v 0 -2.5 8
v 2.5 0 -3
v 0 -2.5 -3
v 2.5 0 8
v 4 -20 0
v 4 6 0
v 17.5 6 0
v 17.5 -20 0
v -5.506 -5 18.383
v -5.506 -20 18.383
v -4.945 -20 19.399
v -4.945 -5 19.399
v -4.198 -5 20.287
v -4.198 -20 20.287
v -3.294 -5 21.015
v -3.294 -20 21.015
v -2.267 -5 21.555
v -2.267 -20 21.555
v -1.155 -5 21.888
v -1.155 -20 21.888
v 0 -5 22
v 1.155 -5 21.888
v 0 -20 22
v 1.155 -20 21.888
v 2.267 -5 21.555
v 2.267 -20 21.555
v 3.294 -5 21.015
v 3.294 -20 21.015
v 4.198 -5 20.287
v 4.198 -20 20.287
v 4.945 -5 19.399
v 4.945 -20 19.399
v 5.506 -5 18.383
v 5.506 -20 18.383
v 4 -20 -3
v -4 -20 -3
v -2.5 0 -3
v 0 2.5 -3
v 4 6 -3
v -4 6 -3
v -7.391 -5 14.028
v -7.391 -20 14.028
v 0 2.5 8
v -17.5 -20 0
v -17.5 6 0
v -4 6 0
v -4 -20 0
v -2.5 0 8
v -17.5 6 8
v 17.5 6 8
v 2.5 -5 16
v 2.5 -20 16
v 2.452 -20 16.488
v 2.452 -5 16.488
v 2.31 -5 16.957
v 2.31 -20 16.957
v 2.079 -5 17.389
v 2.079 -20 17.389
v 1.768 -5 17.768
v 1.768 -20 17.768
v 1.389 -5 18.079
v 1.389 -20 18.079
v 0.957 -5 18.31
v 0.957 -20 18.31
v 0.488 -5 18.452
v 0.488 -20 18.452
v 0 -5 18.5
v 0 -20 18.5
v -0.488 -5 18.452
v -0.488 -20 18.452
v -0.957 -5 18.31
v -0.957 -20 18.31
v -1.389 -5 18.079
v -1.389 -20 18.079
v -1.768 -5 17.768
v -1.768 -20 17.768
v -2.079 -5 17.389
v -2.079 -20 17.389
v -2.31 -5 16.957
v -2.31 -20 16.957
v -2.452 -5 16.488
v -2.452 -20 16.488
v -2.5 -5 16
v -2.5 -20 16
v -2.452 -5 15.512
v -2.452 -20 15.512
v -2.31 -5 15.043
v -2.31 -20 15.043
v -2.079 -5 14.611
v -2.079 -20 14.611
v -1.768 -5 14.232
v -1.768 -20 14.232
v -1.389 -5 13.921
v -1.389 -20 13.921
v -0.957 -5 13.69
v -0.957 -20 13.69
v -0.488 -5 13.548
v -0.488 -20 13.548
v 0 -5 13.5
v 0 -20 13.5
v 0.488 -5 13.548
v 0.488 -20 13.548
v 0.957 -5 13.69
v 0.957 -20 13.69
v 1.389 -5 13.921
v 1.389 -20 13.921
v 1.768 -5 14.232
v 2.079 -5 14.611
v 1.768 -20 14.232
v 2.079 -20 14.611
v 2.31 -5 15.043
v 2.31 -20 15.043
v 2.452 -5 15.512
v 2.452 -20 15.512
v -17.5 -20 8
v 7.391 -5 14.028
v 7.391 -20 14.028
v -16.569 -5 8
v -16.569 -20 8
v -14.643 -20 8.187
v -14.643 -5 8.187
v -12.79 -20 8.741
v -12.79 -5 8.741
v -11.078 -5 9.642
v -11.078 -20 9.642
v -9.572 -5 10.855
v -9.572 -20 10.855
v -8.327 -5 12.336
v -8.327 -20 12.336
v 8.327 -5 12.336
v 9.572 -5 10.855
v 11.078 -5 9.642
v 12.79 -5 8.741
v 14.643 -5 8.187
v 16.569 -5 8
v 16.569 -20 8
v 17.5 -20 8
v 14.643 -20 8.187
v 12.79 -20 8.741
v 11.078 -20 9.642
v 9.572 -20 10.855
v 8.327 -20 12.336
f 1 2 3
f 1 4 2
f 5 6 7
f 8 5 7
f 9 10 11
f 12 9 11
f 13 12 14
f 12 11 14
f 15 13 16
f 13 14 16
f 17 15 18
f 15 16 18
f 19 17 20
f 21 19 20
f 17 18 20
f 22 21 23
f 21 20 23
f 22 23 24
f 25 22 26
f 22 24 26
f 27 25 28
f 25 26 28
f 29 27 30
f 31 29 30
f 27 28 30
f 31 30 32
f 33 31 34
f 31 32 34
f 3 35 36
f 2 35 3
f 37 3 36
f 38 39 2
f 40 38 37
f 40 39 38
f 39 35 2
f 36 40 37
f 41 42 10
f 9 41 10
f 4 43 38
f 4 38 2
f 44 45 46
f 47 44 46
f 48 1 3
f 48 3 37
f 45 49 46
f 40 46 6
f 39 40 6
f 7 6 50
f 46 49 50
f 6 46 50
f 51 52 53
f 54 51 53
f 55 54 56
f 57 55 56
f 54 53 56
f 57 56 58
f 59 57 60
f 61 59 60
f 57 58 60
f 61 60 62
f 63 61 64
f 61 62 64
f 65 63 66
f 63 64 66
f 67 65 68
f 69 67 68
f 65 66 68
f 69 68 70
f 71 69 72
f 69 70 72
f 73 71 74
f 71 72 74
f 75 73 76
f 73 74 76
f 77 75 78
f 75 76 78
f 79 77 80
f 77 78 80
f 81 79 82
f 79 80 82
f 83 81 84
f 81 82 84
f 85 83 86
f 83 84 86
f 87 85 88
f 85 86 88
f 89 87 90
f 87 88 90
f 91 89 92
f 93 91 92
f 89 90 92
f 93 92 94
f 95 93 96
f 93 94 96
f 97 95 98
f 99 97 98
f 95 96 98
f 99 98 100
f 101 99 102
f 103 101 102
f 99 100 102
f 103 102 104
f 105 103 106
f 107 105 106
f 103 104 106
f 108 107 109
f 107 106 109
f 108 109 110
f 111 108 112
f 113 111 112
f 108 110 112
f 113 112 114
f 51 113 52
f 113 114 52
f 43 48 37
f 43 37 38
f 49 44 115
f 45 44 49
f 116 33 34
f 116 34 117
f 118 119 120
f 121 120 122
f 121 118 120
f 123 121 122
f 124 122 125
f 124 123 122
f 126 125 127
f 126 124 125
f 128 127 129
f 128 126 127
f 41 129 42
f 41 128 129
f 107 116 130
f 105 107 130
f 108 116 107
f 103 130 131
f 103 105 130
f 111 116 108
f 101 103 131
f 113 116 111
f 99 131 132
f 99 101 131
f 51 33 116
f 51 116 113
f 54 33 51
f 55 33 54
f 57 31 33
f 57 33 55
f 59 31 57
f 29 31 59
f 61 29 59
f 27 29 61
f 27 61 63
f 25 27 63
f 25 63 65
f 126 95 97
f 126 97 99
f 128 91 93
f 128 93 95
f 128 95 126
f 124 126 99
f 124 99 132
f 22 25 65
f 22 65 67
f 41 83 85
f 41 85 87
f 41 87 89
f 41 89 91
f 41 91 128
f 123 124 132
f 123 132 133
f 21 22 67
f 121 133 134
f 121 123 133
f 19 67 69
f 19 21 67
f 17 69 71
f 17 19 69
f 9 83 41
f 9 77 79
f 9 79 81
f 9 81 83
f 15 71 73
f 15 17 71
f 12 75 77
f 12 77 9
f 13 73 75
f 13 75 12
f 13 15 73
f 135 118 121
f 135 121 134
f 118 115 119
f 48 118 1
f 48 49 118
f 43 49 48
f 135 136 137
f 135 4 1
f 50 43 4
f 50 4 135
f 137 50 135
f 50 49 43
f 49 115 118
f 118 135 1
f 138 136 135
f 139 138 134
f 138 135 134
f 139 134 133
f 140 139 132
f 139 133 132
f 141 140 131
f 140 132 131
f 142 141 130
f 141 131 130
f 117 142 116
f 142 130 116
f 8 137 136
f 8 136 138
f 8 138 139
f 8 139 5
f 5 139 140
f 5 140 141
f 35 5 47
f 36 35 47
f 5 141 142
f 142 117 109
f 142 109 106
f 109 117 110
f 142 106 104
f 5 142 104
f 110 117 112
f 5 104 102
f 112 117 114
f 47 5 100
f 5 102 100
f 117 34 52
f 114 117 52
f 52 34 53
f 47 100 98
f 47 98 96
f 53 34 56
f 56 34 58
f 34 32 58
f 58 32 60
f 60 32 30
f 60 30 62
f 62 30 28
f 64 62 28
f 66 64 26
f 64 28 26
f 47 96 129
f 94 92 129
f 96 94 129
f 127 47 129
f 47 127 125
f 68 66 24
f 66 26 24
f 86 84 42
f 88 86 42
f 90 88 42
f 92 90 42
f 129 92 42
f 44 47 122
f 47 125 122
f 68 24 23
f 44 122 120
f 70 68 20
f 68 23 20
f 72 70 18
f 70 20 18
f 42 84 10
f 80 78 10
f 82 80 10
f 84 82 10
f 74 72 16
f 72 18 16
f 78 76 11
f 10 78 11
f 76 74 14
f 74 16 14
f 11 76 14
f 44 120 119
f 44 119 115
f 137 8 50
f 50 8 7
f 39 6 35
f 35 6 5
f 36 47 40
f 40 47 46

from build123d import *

# Parameters (mm, degrees)
SKIZZE1_W                       = 35
SKIZZE1_H                       = 26
AUFSATZ_LINEAR_AUSTRAGEN1_DEPTH = 8
AUFSATZ_LINEAR_AUSTRAGEN2_DEPTH = 3
SKIZZE3_R                       = 2.5
AUFSATZ_LINEAR_AUSTRAGEN3_DEPTH = 15
VERRUNDUNG1_R                   = 10


with BuildPart() as part:
    # Skizze1 → Aufsatz-Linear austragen1 (new body)
    with BuildSketch(Plane.XY):
        with Locations((0, -7)):
            Rectangle(SKIZZE1_W, SKIZZE1_H)
        Polygon((0, 2.5), (-2.5, 0), (0, -2.5), (2.5, 0), align=None, mode=Mode.SUBTRACT)
    extrude(amount=AUFSATZ_LINEAR_AUSTRAGEN1_DEPTH)

    # Skizze2 → Aufsatz-Linear austragen2 (add)
    with BuildSketch(Plane(origin=(0, 0, 0), x_dir=(-1, 0, 0), z_dir=(0, 0, -1))):
        Polygon((0, 6), (-4, 6), (-4, -20), (0, -20), (4, -20), (4, 6), align=None)
        Polygon((-2.5, 0), (0, -2.5), (2.5, 0), (0, 2.5), align=None, mode=Mode.SUBTRACT)
    extrude(amount=AUFSATZ_LINEAR_AUSTRAGEN2_DEPTH)

    # Skizze3 → Aufsatz-Linear austragen3 (add)
    with BuildSketch(Plane.XZ.offset(20)):
        with BuildLine():
            Line((0, 8), (-10, 8))
            Line((-10, 8), (-5.506451268, 18.383064085))
            ThreePointArc((-5.506451268, 18.383064085), (0, 22), (5.506451268, 18.383064085))
            Line((5.506451268, 18.383064085), (10, 8))
            Line((10, 8), (0, 8))
        make_face()
        with Locations((0, 16)):
            Circle(SKIZZE3_R, mode=Mode.SUBTRACT)
    extrude(amount=-AUFSATZ_LINEAR_AUSTRAGEN3_DEPTH)

    # Verrundung1
    verrundung1_edges = [part.edges().sort_by_distance(p)[0] for p in [
        (10, -12.5, 8),
        (-10, -12.5, 8),
    ]]
    fillet(verrundung1_edges, radius=VERRUNDUNG1_R)


solid = part.part
